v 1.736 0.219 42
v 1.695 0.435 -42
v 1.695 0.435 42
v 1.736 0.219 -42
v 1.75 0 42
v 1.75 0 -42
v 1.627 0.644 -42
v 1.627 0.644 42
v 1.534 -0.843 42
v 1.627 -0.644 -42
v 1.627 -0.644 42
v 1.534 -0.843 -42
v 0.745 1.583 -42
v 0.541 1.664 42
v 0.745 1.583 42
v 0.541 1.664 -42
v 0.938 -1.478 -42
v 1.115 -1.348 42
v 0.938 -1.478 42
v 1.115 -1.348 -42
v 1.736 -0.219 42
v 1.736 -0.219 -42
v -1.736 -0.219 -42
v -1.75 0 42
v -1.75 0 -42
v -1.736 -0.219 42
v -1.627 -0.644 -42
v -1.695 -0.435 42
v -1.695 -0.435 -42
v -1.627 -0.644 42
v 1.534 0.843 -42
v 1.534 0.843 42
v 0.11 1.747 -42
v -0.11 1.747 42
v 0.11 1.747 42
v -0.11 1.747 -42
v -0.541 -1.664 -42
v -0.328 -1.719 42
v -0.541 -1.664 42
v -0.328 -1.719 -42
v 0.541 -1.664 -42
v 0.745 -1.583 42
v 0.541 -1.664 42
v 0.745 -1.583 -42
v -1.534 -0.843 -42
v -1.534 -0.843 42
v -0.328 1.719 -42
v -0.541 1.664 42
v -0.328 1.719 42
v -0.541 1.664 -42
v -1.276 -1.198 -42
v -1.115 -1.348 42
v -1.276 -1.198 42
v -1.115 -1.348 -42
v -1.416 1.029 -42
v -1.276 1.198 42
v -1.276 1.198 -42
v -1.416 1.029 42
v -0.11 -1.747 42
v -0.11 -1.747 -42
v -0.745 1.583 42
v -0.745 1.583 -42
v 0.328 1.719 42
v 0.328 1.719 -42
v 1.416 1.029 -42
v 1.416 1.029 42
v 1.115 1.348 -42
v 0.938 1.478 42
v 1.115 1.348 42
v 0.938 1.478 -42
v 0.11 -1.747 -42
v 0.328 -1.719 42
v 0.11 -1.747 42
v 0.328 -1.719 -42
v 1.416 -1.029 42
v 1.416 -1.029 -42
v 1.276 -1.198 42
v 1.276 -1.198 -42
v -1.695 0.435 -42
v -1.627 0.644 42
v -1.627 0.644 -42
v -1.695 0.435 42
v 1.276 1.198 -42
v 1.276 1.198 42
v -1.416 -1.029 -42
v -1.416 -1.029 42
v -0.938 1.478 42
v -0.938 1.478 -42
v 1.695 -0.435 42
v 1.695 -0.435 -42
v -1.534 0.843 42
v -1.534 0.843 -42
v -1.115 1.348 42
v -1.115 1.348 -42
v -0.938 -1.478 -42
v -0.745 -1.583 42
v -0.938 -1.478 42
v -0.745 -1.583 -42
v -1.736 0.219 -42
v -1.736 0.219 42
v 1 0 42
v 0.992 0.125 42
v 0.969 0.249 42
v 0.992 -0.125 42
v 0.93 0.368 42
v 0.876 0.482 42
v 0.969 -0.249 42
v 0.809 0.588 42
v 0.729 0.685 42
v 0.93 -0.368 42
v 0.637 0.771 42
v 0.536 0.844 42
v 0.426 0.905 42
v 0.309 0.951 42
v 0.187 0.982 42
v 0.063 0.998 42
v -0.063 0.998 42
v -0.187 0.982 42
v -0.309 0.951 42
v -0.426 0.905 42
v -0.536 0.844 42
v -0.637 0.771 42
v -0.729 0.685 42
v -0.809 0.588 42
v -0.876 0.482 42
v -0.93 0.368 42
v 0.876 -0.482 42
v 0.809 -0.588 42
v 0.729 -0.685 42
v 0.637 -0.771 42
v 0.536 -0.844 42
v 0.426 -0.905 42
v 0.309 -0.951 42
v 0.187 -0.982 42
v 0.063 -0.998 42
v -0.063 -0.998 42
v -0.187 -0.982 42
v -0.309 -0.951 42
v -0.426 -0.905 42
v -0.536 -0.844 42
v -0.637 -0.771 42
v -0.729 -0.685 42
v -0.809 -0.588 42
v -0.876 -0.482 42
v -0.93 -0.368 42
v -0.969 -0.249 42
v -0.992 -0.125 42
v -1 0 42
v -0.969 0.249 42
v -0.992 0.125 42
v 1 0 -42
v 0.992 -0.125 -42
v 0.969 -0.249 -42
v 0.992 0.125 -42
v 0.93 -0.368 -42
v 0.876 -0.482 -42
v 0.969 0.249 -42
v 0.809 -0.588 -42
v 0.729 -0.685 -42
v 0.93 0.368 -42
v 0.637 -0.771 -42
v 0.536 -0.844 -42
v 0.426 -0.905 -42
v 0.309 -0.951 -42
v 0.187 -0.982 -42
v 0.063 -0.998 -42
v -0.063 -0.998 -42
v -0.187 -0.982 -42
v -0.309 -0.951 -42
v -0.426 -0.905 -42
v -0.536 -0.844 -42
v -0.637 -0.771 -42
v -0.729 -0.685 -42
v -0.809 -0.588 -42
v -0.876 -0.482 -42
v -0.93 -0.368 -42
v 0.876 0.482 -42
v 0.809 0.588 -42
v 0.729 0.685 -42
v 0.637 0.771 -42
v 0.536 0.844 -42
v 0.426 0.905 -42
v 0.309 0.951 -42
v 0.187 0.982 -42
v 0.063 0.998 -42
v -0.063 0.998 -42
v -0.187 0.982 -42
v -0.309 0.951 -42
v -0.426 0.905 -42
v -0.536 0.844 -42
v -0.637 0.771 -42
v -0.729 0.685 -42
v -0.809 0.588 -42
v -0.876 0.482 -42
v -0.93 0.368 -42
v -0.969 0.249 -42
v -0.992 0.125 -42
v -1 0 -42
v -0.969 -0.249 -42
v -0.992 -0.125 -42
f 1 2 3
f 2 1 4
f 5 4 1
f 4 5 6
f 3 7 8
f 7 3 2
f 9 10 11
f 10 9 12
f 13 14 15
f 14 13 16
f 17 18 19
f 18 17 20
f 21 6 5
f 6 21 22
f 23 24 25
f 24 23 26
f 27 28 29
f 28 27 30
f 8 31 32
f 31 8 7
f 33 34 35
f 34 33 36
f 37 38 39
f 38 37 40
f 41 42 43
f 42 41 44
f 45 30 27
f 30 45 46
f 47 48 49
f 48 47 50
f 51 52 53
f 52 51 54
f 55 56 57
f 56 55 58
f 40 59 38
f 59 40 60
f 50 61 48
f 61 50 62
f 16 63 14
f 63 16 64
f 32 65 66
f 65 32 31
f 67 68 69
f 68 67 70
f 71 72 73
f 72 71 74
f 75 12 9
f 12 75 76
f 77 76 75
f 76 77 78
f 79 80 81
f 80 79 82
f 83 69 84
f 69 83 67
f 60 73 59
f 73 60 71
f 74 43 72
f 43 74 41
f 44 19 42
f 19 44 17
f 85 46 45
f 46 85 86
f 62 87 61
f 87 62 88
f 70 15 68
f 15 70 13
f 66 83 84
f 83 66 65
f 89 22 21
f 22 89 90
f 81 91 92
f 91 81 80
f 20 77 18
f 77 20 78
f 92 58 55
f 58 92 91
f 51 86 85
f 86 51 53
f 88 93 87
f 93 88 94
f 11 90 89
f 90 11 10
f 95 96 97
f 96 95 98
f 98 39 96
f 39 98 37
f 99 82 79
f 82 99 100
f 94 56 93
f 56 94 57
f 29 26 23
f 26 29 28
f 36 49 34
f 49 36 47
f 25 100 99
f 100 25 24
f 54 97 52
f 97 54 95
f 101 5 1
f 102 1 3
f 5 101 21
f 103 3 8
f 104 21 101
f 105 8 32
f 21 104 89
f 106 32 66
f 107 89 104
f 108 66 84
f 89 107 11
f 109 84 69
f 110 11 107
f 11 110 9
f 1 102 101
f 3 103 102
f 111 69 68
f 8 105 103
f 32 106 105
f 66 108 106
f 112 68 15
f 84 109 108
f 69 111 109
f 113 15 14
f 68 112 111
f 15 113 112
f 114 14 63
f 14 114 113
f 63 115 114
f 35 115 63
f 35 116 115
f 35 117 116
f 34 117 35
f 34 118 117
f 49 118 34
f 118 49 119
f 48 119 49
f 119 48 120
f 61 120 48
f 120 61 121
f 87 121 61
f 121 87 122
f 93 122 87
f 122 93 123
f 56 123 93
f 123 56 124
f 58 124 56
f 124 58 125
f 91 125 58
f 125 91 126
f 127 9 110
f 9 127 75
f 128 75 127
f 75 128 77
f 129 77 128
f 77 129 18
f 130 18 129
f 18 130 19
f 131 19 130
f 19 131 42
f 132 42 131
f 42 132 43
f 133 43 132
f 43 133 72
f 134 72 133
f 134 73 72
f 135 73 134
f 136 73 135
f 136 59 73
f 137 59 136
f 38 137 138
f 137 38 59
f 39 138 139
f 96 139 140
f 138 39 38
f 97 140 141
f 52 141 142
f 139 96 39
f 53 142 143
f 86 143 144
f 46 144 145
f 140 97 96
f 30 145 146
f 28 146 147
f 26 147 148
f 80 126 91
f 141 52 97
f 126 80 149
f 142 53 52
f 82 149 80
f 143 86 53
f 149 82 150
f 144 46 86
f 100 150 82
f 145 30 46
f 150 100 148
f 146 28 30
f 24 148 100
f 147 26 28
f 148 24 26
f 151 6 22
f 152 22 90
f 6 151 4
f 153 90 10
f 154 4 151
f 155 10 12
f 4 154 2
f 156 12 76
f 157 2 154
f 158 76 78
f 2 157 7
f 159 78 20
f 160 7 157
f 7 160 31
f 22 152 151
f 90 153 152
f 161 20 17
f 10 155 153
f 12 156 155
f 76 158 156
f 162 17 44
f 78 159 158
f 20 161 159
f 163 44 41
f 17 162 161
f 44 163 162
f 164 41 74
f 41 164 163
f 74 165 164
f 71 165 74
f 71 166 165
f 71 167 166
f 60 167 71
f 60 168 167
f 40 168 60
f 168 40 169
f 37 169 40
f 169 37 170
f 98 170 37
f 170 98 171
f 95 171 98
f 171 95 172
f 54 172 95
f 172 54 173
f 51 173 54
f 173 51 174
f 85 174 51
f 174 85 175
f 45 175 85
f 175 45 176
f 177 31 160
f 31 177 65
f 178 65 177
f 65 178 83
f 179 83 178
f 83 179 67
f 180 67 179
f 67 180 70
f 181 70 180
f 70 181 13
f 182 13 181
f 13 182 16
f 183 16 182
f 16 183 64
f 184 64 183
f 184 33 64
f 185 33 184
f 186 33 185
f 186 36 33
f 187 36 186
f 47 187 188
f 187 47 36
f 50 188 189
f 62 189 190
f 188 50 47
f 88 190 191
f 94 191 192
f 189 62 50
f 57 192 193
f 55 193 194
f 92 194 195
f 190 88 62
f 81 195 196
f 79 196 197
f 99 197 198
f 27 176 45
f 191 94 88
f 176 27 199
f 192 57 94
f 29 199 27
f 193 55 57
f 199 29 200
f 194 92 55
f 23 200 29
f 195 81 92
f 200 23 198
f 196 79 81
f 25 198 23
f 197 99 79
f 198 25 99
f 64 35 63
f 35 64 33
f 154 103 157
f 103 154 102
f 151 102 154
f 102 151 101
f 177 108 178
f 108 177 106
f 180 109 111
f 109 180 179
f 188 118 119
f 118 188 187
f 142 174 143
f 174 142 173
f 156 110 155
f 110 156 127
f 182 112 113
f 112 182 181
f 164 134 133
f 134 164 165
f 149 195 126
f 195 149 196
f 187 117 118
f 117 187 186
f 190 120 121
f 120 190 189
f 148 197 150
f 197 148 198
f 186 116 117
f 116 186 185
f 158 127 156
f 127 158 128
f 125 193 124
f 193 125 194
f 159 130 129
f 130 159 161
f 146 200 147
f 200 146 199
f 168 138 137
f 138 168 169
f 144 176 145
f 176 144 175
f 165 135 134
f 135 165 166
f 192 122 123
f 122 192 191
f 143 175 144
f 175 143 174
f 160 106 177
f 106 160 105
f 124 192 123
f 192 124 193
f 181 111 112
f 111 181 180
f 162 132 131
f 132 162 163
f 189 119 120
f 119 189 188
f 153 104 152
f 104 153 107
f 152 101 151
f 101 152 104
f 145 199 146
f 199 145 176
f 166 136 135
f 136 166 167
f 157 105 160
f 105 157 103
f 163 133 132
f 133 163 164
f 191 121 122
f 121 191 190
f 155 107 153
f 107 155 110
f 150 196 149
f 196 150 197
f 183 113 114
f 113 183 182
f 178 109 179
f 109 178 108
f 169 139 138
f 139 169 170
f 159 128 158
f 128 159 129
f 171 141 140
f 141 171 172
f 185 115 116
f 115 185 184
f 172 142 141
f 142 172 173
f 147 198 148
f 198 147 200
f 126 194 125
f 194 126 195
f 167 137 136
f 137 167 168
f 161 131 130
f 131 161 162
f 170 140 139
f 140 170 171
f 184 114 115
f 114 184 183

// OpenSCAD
$fn = 50;


difference() {
	union() {
		translate(v = [0, 0, -42.0000000000]) {
			cylinder(h = 84, r = 1.7500000000);
		}
	}
	union() {
		translate(v = [0, 0, -100.0000000000]) {
			cylinder(h = 200, r = 1.0000000000);
		}
	}
}
